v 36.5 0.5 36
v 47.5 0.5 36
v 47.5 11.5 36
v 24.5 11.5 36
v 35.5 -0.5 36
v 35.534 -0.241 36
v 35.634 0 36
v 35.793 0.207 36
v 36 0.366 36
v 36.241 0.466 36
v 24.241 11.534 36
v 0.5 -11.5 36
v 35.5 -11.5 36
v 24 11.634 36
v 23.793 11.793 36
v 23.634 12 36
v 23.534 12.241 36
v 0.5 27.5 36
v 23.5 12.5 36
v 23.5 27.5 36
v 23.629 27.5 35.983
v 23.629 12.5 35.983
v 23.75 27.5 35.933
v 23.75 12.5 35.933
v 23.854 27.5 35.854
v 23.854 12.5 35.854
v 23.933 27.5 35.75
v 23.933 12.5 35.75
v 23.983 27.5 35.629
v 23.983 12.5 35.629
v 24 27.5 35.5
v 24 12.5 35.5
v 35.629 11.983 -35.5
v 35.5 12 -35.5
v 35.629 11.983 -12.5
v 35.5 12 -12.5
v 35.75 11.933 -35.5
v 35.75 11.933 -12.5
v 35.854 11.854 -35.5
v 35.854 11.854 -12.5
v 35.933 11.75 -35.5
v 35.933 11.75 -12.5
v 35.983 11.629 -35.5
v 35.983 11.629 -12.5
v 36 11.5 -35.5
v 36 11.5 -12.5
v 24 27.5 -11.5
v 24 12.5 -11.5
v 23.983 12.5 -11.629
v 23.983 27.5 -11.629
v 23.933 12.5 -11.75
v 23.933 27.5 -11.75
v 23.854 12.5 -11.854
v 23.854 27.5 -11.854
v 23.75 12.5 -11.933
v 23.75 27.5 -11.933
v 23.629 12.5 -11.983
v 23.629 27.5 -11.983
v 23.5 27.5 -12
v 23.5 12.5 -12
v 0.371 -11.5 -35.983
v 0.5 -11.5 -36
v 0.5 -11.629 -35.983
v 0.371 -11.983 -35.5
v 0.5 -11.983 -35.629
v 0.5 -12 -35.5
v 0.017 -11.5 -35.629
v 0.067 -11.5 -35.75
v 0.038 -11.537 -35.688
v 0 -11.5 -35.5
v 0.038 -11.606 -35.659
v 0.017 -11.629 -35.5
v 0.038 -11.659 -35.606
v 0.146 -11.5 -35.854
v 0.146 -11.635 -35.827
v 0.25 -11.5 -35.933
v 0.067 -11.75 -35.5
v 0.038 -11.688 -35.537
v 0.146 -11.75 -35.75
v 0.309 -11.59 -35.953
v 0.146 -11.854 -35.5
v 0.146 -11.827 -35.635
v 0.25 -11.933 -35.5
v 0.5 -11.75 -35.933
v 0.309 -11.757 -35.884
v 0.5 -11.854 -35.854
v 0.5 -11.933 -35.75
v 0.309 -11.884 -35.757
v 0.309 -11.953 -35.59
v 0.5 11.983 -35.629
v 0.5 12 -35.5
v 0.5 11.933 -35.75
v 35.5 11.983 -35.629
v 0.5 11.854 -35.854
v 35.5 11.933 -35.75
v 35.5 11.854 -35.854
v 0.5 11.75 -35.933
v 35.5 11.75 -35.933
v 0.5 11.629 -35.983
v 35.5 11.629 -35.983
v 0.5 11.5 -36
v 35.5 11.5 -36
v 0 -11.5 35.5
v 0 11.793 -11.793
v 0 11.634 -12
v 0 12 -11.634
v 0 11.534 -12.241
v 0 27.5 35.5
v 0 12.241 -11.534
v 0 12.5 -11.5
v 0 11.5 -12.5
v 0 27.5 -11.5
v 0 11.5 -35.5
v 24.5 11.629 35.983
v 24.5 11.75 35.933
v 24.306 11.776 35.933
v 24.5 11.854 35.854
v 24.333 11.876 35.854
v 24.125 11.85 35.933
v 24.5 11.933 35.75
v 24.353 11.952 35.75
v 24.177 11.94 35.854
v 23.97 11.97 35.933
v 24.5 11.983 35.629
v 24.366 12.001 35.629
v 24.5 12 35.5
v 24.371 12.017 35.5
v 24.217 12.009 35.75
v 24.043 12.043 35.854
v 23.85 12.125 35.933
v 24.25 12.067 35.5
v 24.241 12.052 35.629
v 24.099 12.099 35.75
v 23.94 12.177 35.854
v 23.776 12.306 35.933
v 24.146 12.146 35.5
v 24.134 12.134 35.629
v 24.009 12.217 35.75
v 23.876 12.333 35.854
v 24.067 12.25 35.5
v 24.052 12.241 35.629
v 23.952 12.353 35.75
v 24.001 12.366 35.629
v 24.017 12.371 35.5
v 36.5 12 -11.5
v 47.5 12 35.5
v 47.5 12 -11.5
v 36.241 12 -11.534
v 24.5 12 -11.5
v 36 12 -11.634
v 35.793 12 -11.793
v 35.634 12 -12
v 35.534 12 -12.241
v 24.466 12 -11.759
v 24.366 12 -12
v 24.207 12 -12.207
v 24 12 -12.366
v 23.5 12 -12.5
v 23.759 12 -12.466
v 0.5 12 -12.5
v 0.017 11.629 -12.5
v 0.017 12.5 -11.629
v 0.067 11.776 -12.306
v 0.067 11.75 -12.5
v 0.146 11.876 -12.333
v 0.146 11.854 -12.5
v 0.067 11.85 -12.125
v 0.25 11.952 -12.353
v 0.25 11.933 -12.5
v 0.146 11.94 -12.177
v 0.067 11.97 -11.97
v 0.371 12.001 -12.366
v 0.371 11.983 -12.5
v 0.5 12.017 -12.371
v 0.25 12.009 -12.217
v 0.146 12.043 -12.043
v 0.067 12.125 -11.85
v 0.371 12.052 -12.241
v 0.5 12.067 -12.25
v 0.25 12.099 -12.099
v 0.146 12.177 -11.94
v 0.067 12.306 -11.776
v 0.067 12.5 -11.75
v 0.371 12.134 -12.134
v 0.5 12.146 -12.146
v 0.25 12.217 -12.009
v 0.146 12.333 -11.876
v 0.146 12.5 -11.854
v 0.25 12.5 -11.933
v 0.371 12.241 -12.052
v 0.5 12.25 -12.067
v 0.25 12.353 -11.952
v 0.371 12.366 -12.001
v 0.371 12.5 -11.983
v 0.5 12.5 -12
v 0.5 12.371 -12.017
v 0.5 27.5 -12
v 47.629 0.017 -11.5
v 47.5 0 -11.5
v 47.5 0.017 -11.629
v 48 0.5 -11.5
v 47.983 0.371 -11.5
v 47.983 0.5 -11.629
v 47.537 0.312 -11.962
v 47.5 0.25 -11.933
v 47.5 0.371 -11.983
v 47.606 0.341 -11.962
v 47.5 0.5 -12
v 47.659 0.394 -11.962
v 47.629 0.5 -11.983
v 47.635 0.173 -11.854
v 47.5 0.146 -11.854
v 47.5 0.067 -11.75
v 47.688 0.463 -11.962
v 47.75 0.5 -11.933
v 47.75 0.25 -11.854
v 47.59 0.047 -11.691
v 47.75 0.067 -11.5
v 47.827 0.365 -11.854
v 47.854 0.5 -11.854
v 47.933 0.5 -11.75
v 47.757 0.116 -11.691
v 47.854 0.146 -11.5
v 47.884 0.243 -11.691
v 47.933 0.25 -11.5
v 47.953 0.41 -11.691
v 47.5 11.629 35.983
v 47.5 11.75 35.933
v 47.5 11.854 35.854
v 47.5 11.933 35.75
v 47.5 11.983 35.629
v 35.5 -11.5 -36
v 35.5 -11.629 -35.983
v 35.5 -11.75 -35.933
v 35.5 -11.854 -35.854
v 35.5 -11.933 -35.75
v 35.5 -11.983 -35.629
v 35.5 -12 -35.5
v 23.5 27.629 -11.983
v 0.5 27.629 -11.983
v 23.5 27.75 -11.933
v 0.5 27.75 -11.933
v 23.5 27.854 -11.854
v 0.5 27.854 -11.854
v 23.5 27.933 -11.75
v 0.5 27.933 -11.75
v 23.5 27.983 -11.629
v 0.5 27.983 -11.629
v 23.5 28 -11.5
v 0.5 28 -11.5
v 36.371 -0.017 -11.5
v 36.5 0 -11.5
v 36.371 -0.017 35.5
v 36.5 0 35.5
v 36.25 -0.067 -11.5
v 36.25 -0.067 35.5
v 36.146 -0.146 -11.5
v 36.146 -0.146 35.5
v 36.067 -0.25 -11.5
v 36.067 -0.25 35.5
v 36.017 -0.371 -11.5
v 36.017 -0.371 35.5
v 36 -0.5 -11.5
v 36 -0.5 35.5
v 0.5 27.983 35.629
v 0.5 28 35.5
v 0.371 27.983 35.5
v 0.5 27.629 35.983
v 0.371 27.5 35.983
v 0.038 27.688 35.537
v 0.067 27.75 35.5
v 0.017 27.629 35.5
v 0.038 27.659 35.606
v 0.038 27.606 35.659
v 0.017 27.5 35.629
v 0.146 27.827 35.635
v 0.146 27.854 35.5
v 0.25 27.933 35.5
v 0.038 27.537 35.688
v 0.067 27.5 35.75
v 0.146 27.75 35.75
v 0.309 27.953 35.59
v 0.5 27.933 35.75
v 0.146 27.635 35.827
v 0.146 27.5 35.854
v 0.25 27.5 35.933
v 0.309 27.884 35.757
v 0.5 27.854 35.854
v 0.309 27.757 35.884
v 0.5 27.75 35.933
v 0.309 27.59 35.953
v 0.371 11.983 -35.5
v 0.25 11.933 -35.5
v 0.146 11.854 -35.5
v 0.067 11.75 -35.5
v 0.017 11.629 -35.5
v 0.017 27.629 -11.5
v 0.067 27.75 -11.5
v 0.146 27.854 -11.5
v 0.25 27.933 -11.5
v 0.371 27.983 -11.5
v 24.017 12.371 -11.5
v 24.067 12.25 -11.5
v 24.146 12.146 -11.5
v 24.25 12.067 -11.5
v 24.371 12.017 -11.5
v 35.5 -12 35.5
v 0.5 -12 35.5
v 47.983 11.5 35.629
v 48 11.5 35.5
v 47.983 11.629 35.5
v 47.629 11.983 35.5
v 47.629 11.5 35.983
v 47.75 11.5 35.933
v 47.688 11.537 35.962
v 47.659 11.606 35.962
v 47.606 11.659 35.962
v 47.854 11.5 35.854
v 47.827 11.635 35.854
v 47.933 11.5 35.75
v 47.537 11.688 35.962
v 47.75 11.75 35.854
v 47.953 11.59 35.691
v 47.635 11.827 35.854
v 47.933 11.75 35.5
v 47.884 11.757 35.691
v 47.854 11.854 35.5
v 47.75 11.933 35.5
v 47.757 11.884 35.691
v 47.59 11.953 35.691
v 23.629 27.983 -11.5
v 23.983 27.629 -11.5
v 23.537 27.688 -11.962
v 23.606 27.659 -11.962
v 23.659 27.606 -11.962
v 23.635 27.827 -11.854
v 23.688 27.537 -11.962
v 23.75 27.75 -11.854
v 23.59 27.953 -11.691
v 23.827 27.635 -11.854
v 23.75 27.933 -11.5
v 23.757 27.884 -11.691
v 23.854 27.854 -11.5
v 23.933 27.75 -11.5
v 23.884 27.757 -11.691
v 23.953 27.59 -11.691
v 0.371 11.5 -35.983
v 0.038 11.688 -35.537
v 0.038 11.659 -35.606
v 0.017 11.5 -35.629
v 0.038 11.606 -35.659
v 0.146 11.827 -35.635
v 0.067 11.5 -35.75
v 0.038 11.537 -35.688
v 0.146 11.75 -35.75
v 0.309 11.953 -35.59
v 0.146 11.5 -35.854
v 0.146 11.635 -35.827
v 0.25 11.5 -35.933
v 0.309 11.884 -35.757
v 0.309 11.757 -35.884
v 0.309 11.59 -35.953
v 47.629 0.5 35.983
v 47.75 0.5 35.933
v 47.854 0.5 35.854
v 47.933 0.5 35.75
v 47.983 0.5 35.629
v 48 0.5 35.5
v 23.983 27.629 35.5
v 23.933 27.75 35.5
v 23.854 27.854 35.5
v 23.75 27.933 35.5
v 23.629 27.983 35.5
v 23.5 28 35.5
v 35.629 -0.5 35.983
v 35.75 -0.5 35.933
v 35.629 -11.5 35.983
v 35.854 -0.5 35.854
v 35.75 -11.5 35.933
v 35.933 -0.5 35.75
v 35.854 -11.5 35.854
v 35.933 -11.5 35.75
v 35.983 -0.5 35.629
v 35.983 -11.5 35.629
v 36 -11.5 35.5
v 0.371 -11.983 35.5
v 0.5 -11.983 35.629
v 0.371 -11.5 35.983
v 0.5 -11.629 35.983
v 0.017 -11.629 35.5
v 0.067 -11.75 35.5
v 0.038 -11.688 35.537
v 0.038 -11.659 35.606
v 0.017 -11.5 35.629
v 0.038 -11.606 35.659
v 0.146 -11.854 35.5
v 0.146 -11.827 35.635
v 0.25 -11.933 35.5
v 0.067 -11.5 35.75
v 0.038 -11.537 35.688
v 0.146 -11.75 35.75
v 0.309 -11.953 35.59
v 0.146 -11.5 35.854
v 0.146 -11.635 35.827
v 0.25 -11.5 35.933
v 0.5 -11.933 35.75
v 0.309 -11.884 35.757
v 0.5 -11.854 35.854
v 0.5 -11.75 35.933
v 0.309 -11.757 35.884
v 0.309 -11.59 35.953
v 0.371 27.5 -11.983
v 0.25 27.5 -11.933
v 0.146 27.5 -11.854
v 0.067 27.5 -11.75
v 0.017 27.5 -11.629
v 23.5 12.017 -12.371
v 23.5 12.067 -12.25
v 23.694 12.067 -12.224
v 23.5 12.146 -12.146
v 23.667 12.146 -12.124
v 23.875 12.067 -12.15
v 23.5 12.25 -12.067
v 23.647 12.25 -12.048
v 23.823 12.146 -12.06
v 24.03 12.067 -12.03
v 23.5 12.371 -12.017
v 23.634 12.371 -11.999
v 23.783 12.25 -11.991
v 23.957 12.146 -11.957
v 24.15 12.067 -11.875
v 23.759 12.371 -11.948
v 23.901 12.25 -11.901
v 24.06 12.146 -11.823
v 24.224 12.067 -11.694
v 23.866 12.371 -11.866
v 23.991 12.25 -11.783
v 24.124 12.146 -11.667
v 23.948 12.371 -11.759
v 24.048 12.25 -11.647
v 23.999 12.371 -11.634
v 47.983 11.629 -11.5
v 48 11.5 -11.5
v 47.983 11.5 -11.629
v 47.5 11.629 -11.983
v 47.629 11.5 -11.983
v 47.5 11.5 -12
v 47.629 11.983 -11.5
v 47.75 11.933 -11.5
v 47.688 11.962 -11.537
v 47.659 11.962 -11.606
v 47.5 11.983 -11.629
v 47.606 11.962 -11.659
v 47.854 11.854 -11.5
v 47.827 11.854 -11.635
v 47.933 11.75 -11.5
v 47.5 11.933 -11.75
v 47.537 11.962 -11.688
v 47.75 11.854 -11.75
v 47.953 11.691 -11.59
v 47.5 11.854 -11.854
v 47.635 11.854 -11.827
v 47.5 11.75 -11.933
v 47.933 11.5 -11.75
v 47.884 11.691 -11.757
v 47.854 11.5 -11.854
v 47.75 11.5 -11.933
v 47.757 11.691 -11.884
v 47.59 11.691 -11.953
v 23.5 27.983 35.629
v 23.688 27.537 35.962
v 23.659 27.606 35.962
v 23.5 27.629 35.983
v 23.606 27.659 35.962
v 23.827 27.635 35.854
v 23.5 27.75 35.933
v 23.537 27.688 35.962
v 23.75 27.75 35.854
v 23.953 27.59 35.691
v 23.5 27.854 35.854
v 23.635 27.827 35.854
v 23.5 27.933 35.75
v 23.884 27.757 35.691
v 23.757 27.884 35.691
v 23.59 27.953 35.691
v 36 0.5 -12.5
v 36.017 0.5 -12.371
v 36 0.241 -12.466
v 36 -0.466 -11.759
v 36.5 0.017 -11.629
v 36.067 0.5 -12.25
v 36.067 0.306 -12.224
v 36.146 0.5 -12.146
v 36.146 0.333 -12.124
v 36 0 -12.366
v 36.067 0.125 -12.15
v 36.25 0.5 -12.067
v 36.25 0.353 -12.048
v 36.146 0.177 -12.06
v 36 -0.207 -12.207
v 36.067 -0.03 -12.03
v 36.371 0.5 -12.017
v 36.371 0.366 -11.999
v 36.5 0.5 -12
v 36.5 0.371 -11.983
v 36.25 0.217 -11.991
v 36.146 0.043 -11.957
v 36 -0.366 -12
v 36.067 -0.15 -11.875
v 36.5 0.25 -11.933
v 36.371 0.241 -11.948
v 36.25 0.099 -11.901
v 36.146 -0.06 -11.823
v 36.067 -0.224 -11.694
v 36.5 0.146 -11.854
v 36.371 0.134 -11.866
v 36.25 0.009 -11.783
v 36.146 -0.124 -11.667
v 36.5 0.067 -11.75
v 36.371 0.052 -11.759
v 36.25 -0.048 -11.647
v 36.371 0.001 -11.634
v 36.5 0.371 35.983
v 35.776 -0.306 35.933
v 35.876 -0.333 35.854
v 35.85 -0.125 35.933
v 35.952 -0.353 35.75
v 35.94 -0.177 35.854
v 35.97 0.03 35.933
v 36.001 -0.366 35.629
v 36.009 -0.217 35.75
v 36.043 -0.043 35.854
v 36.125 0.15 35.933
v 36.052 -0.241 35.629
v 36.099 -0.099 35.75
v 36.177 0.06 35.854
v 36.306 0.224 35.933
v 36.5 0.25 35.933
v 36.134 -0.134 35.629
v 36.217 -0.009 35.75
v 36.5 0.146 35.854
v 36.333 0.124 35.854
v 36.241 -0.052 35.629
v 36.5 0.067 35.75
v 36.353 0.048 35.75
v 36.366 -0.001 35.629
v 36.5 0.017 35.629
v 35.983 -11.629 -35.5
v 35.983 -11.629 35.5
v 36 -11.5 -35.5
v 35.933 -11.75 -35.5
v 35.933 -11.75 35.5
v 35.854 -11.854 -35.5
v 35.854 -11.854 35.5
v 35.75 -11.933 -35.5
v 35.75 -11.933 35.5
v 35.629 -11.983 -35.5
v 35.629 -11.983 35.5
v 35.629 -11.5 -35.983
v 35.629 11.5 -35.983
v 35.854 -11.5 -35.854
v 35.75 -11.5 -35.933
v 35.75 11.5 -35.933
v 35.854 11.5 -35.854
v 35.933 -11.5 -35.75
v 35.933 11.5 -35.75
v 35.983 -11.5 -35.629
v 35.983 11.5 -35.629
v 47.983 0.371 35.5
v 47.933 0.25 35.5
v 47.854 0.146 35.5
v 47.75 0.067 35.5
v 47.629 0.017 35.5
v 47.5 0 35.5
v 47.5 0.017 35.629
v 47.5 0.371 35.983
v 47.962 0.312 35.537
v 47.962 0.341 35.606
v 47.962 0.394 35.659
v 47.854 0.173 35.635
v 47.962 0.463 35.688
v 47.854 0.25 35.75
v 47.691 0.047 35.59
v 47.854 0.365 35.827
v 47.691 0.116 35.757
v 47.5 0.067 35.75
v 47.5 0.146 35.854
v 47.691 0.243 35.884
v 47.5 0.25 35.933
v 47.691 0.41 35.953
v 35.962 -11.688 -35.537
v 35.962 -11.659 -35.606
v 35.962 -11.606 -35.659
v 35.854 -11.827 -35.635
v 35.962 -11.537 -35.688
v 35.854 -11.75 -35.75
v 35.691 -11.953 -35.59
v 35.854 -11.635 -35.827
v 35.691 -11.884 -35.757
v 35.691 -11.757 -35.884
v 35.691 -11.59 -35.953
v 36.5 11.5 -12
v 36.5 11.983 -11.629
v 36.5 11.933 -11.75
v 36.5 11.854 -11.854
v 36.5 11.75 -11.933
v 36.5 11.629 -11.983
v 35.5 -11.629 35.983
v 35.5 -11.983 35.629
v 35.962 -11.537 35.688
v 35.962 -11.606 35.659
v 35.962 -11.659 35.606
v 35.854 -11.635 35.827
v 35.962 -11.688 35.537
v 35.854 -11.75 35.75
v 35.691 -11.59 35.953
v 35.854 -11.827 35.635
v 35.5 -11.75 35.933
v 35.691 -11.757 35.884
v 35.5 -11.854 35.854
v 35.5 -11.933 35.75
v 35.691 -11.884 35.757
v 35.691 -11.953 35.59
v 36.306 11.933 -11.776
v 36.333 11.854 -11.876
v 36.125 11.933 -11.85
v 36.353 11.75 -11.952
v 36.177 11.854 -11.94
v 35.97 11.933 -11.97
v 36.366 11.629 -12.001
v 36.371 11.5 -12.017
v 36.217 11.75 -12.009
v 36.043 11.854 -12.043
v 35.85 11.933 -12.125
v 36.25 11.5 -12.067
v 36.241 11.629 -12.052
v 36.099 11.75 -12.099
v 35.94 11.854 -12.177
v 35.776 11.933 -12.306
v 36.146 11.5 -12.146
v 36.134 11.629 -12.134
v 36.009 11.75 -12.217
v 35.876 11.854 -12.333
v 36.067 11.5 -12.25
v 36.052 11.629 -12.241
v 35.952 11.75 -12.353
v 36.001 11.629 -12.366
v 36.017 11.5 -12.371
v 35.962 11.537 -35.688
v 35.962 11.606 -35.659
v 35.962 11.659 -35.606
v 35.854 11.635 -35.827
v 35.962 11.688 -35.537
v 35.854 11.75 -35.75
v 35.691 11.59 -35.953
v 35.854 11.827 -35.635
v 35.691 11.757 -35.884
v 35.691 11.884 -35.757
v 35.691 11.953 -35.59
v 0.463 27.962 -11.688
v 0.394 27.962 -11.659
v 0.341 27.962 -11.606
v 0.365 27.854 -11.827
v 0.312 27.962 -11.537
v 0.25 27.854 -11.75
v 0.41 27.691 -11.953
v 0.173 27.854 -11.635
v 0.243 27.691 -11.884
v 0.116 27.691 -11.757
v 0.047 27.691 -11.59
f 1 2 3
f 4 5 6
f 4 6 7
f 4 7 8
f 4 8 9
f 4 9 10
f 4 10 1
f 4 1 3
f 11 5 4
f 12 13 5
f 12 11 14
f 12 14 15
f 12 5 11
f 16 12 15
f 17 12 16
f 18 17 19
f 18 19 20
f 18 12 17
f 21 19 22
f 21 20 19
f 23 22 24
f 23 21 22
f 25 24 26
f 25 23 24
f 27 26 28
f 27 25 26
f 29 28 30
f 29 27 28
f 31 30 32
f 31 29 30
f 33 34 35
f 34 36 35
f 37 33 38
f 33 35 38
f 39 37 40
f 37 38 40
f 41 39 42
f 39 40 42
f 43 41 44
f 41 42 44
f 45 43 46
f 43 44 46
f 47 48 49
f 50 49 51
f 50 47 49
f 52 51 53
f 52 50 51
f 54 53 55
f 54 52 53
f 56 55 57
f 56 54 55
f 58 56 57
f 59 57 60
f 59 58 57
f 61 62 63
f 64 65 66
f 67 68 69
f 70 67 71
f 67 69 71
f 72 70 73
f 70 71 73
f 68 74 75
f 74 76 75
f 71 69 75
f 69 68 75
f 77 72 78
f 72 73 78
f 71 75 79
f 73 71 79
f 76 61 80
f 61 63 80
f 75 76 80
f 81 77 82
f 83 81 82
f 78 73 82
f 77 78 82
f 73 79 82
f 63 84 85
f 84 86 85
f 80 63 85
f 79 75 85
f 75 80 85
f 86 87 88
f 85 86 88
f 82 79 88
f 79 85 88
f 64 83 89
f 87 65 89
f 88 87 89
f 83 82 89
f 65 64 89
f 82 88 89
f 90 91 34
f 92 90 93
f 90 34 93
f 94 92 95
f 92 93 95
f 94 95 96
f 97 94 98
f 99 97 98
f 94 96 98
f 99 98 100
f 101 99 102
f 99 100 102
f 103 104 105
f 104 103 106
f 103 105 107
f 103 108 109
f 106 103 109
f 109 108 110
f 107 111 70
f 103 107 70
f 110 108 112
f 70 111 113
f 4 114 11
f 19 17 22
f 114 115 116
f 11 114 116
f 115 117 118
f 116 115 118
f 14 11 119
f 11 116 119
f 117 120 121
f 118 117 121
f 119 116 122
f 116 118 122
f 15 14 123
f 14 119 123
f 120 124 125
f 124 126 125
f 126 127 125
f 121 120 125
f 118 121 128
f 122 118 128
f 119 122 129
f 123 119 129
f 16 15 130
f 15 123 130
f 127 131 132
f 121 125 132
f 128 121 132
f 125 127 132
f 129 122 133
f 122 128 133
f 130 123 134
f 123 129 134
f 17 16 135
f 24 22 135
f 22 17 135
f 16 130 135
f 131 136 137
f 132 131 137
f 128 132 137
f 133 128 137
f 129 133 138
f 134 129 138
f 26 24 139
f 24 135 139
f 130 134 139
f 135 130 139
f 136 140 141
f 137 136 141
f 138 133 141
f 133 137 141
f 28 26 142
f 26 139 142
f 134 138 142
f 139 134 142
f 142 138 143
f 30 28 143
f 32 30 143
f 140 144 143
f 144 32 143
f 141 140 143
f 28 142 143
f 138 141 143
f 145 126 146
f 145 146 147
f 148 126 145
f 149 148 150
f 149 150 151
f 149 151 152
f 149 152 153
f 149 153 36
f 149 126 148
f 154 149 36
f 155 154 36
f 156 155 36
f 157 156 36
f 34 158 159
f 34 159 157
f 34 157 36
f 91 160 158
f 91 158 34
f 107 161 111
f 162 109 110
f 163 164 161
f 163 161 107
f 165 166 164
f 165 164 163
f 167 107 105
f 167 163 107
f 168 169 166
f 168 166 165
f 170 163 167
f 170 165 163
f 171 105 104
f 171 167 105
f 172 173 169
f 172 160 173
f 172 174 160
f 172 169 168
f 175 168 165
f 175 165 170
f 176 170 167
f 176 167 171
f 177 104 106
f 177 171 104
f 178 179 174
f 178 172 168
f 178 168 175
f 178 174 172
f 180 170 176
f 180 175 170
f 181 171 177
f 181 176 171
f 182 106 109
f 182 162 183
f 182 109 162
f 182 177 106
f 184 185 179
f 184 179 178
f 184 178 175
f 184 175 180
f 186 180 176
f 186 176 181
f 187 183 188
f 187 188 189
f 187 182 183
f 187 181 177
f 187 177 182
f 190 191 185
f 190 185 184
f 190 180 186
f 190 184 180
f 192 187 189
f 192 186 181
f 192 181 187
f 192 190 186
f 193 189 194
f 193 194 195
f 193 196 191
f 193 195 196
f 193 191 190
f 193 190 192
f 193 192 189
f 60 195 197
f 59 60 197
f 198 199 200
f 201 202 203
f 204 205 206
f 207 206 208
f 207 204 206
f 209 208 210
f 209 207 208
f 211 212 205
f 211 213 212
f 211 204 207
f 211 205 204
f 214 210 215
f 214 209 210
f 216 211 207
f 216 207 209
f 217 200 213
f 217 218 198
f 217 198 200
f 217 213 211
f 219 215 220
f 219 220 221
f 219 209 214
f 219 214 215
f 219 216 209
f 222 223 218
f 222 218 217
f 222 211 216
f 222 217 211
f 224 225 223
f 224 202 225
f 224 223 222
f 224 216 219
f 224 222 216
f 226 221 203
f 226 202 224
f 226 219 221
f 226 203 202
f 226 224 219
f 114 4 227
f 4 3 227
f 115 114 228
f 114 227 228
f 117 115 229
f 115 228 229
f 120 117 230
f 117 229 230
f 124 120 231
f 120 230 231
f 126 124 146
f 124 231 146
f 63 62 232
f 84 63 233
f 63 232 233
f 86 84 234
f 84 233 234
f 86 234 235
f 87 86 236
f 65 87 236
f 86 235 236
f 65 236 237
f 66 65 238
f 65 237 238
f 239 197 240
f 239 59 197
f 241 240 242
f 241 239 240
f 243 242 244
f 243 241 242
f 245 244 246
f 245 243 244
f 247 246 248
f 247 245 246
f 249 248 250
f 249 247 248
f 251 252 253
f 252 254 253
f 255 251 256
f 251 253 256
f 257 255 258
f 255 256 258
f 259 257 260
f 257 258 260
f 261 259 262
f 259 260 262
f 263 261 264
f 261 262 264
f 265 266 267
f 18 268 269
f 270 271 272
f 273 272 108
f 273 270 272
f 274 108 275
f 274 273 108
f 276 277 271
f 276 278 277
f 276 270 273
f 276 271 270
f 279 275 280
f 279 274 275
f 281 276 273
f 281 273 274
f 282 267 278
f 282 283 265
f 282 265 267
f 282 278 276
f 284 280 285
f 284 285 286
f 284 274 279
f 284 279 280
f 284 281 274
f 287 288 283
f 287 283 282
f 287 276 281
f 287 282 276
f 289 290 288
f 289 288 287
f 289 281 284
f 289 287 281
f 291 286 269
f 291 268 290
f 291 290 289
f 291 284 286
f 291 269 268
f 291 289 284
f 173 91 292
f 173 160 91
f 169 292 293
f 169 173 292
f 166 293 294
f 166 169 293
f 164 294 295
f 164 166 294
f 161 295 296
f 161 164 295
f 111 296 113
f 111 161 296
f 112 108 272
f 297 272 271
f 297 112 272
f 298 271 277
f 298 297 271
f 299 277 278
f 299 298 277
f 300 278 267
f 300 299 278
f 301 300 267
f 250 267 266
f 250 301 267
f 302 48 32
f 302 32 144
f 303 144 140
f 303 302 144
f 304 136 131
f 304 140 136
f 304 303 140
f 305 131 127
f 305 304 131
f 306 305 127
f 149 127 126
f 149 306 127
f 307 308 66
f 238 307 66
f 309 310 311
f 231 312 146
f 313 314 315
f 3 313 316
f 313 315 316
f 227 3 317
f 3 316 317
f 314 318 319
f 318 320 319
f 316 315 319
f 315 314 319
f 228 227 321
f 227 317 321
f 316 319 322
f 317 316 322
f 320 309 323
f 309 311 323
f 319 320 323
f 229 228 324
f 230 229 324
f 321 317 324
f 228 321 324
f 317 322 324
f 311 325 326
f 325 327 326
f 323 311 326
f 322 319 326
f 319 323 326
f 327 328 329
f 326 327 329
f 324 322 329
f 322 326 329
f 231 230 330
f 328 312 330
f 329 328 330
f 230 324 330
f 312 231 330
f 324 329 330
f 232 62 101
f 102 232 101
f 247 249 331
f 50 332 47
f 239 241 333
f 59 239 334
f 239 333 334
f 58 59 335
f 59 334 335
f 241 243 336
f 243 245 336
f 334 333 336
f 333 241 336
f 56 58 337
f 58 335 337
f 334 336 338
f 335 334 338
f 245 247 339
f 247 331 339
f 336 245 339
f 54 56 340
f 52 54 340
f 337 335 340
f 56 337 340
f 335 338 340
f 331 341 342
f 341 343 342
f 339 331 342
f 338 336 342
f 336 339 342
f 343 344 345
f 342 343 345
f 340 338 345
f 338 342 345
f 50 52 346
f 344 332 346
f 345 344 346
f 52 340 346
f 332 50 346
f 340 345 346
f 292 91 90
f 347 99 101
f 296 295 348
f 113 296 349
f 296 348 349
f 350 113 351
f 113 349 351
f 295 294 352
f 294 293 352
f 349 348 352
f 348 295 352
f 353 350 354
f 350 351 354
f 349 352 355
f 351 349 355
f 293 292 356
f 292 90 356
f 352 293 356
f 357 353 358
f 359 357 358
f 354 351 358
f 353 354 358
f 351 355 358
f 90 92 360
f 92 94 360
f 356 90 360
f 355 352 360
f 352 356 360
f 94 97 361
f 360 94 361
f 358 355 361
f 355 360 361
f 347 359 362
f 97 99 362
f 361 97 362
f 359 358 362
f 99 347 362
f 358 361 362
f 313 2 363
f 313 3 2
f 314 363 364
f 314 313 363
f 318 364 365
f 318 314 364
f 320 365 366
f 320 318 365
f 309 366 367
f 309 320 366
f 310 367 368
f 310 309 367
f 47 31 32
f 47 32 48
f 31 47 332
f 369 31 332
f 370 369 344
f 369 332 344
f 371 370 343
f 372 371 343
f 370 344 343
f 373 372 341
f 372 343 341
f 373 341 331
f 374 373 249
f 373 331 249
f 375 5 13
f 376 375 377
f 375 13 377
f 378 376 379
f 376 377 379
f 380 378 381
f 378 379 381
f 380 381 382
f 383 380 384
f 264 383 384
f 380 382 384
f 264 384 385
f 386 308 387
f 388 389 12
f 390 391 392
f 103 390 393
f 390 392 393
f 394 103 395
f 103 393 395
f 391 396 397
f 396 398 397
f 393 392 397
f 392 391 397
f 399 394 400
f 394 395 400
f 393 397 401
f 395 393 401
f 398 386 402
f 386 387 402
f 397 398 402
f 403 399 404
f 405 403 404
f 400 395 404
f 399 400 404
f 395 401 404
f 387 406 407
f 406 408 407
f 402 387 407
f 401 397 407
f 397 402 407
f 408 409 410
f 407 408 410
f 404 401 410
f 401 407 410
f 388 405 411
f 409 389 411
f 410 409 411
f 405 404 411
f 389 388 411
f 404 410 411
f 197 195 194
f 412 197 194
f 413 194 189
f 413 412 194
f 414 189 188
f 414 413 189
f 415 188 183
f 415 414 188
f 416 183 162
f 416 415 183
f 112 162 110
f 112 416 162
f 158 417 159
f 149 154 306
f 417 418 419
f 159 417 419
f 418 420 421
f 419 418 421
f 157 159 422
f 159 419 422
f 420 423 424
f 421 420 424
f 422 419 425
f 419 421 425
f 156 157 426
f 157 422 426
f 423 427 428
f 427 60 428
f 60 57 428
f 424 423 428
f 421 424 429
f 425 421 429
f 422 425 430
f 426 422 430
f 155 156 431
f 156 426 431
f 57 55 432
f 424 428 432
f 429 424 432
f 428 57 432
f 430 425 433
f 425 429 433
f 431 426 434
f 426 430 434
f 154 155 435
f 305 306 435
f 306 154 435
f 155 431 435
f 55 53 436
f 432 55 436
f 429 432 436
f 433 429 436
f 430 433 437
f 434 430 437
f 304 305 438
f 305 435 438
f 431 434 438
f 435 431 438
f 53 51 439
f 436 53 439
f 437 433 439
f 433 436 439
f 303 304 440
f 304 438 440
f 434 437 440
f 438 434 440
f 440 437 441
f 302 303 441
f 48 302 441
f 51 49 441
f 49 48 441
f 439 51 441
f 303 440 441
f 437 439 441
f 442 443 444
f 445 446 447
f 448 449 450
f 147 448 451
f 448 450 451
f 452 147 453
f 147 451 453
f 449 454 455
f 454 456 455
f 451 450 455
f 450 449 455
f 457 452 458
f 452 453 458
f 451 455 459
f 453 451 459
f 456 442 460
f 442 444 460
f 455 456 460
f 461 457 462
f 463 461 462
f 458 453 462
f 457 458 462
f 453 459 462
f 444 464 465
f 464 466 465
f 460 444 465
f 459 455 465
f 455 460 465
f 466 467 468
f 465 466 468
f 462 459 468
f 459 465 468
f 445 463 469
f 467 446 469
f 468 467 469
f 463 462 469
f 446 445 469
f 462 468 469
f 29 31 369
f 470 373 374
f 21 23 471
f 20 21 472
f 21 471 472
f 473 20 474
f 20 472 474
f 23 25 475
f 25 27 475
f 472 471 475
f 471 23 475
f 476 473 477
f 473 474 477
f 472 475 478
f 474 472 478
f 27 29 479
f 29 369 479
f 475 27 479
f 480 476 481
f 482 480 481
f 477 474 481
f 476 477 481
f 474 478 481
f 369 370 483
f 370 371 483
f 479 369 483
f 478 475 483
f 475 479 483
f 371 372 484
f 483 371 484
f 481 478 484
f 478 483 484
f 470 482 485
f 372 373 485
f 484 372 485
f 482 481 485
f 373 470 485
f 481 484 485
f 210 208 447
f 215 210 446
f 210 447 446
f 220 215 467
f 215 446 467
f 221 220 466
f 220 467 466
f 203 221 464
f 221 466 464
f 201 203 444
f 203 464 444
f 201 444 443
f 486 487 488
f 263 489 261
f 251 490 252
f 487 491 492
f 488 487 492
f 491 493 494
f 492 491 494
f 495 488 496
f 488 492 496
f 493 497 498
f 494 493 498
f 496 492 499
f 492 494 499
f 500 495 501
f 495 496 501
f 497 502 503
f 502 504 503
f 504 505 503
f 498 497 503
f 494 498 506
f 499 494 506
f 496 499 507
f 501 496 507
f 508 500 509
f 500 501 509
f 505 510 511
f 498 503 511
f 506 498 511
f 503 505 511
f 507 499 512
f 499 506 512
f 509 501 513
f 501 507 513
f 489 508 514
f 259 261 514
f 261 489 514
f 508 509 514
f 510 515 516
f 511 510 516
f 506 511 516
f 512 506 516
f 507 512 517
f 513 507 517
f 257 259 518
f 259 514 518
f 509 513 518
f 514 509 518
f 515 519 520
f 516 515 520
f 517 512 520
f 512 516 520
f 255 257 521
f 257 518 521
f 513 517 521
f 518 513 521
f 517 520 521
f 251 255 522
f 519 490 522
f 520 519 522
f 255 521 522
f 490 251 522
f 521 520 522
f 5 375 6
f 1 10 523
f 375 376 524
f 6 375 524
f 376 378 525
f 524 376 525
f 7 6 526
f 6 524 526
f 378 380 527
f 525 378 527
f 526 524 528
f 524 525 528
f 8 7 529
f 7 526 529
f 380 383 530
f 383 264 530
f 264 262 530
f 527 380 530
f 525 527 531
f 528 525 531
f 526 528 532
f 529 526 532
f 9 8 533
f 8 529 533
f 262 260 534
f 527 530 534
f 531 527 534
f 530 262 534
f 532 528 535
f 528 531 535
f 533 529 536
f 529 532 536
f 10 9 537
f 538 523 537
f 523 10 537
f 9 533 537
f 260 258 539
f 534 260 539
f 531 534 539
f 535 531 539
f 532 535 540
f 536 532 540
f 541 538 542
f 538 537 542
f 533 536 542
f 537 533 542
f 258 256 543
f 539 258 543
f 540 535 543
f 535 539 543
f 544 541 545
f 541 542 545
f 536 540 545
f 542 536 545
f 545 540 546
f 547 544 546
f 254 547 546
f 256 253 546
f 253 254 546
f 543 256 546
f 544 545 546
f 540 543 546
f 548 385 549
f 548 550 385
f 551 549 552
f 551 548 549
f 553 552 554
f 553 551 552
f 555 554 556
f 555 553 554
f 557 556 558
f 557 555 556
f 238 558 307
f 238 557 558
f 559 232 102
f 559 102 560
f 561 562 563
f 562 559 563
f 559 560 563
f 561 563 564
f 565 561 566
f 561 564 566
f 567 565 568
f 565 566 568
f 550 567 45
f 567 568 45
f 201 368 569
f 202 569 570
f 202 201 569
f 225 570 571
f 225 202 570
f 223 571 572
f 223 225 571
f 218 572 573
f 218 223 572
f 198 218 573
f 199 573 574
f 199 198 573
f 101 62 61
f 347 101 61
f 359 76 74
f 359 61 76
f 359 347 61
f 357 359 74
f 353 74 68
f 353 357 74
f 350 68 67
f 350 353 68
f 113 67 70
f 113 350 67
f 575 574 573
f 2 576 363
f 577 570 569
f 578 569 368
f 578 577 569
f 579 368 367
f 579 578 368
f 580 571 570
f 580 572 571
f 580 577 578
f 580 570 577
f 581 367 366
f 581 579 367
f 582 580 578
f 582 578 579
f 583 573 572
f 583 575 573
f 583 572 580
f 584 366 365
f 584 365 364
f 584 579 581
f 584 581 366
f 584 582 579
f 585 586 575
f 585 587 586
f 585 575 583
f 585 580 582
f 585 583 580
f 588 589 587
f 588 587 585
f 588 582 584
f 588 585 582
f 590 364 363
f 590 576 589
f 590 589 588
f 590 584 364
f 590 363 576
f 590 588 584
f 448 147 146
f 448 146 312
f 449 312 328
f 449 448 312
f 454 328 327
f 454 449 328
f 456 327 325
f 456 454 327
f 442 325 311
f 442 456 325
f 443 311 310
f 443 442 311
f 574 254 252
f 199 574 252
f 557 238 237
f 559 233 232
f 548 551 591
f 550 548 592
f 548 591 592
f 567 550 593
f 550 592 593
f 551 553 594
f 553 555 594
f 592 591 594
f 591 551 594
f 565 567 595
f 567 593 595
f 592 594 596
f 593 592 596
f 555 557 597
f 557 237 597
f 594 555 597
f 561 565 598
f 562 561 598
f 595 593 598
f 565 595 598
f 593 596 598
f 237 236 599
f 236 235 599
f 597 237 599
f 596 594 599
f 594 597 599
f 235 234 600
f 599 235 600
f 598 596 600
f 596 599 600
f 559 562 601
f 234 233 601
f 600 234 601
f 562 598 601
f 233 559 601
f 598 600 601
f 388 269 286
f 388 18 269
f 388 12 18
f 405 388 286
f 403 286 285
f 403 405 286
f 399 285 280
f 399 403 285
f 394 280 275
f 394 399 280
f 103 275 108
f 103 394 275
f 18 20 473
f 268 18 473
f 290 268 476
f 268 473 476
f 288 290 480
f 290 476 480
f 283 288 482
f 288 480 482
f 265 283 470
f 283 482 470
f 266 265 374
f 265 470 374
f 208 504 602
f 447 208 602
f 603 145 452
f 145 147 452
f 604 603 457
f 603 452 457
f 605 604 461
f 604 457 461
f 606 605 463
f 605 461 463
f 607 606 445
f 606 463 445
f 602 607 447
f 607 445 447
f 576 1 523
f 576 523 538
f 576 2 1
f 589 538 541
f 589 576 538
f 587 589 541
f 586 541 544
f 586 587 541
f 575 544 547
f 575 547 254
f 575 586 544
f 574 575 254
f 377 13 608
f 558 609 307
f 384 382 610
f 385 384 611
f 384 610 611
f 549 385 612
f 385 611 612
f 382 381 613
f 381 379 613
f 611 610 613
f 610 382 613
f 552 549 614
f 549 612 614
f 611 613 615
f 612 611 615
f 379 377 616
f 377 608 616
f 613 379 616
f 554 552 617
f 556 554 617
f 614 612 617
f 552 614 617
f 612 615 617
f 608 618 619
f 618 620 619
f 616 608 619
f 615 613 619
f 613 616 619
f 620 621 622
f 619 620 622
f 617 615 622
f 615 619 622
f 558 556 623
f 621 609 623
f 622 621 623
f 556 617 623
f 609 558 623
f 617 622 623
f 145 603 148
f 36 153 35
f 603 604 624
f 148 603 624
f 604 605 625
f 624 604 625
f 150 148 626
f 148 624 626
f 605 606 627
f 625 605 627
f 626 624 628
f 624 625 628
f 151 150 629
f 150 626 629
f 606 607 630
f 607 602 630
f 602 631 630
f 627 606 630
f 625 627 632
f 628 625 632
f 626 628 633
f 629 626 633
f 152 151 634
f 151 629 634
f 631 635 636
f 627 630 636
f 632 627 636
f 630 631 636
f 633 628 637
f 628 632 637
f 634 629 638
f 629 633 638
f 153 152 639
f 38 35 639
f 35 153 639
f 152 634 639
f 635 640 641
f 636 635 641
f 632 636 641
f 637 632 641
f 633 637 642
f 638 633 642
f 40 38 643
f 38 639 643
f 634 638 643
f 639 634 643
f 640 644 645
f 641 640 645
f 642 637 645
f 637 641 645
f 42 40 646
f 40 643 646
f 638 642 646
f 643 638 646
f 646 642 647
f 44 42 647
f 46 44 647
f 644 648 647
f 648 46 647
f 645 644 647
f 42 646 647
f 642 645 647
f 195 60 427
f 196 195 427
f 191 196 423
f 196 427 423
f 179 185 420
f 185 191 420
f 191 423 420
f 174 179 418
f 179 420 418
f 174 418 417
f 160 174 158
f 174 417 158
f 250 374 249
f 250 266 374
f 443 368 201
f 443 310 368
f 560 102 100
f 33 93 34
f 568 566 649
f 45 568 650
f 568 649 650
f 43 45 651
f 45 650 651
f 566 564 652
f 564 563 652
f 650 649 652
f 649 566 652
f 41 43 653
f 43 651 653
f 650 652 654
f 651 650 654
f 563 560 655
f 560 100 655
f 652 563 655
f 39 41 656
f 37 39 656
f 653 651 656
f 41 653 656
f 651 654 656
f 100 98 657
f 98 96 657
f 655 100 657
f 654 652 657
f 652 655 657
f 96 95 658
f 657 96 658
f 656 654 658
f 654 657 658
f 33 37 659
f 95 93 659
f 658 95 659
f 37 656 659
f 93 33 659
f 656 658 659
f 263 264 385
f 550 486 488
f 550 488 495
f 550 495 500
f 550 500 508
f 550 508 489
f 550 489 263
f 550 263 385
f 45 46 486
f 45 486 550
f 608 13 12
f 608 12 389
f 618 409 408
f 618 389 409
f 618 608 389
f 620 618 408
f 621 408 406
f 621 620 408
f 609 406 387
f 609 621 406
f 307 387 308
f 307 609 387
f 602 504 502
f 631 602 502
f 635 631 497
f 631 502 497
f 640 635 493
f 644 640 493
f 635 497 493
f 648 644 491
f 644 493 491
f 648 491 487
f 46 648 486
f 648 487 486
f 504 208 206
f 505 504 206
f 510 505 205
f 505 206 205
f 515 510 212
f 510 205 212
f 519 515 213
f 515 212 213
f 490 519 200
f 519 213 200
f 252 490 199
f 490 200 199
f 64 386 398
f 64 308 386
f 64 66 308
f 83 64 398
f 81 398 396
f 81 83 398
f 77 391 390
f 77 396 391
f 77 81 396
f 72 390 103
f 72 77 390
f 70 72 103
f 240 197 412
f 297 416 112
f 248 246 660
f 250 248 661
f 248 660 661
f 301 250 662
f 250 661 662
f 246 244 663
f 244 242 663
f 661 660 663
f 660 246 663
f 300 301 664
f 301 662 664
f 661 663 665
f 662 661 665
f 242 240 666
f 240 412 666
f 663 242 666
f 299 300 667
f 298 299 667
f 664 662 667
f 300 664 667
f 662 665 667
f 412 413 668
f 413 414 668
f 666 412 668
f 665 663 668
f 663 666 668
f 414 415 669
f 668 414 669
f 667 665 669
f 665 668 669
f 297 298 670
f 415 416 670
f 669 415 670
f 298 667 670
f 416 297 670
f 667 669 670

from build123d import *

# Parameters (mm, degrees)
BOSS_EXTRUDE1_DEPTH = 36
SKETCH1_3_W         = 48
SKETCH1_3_H         = 12
BOSS_EXTRUDE2_DEPTH = 48
SKETCH1_4_W         = 48
SKETCH1_4_H         = 16
BOSS_EXTRUDE3_DEPTH = 24
FILLET1_R           = 0.5


with BuildPart() as part:
    # Sketch1 → Boss-Extrude1 (new body)
    with BuildSketch(Plane(origin=(0, 0, 0), x_dir=(0, 0, -1), z_dir=(1, 0, 0))):
        Polygon((-36, 0), (-36, -12), (36, -12), (36, 12), (12, 12), (12, 0), align=None)
    extrude(amount=BOSS_EXTRUDE1_DEPTH)

    # Sketch1<3> → Boss-Extrude2 (add)
    with BuildSketch(Plane(origin=(0, 0, 0), x_dir=(0, 0, -1), z_dir=(1, 0, 0))):
        with Locations((-12, 6)):
            Rectangle(SKETCH1_3_W, SKETCH1_3_H)
    extrude(amount=BOSS_EXTRUDE2_DEPTH)

    # Sketch1<4> → Boss-Extrude3 (add)
    with BuildSketch(Plane(origin=(0, 0, 0), x_dir=(0, 0, -1), z_dir=(1, 0, 0))):
        with Locations((-12, 20)):
            Rectangle(SKETCH1_4_W, SKETCH1_4_H)
    extrude(amount=BOSS_EXTRUDE3_DEPTH)

    # Fillet1
    fillet1_edges = [part.edges().sort_by_distance(p)[0] for p in [
        (36, 0, 12),
        (18, 12, -36),
        (18, -12, -36),
        (18, -12, 36),
        (36, -6, 36),
        (36, -12, 0),
        (42, 0, 36),
        (48, 0, 12),
        (42, 0, -12),
        (48, 6, -12),
        (48, 12, 12),
        (42, 12, -12),
        (48, 6, 36),
        (36, 12, 36),
        (36, 0, -36),
        (36, 12, -24),
        (0, 12, -24),
        (0, 20, -12),
        (12, 12, -12),
        (24, 28, 12),
        (12, 28, -12),
        (24, 20, 36),
        (12, 28, 36),
        (24, 12, 12),
        (24, 20, -12),
        (0, 28, 12),
        (36, 6, -12),
        (0, 0, -36),
        (0, -12, 0),
        (0, 8, 36),
    ]]
    fillet(fillet1_edges, radius=FILLET1_R)


solid = part.part
